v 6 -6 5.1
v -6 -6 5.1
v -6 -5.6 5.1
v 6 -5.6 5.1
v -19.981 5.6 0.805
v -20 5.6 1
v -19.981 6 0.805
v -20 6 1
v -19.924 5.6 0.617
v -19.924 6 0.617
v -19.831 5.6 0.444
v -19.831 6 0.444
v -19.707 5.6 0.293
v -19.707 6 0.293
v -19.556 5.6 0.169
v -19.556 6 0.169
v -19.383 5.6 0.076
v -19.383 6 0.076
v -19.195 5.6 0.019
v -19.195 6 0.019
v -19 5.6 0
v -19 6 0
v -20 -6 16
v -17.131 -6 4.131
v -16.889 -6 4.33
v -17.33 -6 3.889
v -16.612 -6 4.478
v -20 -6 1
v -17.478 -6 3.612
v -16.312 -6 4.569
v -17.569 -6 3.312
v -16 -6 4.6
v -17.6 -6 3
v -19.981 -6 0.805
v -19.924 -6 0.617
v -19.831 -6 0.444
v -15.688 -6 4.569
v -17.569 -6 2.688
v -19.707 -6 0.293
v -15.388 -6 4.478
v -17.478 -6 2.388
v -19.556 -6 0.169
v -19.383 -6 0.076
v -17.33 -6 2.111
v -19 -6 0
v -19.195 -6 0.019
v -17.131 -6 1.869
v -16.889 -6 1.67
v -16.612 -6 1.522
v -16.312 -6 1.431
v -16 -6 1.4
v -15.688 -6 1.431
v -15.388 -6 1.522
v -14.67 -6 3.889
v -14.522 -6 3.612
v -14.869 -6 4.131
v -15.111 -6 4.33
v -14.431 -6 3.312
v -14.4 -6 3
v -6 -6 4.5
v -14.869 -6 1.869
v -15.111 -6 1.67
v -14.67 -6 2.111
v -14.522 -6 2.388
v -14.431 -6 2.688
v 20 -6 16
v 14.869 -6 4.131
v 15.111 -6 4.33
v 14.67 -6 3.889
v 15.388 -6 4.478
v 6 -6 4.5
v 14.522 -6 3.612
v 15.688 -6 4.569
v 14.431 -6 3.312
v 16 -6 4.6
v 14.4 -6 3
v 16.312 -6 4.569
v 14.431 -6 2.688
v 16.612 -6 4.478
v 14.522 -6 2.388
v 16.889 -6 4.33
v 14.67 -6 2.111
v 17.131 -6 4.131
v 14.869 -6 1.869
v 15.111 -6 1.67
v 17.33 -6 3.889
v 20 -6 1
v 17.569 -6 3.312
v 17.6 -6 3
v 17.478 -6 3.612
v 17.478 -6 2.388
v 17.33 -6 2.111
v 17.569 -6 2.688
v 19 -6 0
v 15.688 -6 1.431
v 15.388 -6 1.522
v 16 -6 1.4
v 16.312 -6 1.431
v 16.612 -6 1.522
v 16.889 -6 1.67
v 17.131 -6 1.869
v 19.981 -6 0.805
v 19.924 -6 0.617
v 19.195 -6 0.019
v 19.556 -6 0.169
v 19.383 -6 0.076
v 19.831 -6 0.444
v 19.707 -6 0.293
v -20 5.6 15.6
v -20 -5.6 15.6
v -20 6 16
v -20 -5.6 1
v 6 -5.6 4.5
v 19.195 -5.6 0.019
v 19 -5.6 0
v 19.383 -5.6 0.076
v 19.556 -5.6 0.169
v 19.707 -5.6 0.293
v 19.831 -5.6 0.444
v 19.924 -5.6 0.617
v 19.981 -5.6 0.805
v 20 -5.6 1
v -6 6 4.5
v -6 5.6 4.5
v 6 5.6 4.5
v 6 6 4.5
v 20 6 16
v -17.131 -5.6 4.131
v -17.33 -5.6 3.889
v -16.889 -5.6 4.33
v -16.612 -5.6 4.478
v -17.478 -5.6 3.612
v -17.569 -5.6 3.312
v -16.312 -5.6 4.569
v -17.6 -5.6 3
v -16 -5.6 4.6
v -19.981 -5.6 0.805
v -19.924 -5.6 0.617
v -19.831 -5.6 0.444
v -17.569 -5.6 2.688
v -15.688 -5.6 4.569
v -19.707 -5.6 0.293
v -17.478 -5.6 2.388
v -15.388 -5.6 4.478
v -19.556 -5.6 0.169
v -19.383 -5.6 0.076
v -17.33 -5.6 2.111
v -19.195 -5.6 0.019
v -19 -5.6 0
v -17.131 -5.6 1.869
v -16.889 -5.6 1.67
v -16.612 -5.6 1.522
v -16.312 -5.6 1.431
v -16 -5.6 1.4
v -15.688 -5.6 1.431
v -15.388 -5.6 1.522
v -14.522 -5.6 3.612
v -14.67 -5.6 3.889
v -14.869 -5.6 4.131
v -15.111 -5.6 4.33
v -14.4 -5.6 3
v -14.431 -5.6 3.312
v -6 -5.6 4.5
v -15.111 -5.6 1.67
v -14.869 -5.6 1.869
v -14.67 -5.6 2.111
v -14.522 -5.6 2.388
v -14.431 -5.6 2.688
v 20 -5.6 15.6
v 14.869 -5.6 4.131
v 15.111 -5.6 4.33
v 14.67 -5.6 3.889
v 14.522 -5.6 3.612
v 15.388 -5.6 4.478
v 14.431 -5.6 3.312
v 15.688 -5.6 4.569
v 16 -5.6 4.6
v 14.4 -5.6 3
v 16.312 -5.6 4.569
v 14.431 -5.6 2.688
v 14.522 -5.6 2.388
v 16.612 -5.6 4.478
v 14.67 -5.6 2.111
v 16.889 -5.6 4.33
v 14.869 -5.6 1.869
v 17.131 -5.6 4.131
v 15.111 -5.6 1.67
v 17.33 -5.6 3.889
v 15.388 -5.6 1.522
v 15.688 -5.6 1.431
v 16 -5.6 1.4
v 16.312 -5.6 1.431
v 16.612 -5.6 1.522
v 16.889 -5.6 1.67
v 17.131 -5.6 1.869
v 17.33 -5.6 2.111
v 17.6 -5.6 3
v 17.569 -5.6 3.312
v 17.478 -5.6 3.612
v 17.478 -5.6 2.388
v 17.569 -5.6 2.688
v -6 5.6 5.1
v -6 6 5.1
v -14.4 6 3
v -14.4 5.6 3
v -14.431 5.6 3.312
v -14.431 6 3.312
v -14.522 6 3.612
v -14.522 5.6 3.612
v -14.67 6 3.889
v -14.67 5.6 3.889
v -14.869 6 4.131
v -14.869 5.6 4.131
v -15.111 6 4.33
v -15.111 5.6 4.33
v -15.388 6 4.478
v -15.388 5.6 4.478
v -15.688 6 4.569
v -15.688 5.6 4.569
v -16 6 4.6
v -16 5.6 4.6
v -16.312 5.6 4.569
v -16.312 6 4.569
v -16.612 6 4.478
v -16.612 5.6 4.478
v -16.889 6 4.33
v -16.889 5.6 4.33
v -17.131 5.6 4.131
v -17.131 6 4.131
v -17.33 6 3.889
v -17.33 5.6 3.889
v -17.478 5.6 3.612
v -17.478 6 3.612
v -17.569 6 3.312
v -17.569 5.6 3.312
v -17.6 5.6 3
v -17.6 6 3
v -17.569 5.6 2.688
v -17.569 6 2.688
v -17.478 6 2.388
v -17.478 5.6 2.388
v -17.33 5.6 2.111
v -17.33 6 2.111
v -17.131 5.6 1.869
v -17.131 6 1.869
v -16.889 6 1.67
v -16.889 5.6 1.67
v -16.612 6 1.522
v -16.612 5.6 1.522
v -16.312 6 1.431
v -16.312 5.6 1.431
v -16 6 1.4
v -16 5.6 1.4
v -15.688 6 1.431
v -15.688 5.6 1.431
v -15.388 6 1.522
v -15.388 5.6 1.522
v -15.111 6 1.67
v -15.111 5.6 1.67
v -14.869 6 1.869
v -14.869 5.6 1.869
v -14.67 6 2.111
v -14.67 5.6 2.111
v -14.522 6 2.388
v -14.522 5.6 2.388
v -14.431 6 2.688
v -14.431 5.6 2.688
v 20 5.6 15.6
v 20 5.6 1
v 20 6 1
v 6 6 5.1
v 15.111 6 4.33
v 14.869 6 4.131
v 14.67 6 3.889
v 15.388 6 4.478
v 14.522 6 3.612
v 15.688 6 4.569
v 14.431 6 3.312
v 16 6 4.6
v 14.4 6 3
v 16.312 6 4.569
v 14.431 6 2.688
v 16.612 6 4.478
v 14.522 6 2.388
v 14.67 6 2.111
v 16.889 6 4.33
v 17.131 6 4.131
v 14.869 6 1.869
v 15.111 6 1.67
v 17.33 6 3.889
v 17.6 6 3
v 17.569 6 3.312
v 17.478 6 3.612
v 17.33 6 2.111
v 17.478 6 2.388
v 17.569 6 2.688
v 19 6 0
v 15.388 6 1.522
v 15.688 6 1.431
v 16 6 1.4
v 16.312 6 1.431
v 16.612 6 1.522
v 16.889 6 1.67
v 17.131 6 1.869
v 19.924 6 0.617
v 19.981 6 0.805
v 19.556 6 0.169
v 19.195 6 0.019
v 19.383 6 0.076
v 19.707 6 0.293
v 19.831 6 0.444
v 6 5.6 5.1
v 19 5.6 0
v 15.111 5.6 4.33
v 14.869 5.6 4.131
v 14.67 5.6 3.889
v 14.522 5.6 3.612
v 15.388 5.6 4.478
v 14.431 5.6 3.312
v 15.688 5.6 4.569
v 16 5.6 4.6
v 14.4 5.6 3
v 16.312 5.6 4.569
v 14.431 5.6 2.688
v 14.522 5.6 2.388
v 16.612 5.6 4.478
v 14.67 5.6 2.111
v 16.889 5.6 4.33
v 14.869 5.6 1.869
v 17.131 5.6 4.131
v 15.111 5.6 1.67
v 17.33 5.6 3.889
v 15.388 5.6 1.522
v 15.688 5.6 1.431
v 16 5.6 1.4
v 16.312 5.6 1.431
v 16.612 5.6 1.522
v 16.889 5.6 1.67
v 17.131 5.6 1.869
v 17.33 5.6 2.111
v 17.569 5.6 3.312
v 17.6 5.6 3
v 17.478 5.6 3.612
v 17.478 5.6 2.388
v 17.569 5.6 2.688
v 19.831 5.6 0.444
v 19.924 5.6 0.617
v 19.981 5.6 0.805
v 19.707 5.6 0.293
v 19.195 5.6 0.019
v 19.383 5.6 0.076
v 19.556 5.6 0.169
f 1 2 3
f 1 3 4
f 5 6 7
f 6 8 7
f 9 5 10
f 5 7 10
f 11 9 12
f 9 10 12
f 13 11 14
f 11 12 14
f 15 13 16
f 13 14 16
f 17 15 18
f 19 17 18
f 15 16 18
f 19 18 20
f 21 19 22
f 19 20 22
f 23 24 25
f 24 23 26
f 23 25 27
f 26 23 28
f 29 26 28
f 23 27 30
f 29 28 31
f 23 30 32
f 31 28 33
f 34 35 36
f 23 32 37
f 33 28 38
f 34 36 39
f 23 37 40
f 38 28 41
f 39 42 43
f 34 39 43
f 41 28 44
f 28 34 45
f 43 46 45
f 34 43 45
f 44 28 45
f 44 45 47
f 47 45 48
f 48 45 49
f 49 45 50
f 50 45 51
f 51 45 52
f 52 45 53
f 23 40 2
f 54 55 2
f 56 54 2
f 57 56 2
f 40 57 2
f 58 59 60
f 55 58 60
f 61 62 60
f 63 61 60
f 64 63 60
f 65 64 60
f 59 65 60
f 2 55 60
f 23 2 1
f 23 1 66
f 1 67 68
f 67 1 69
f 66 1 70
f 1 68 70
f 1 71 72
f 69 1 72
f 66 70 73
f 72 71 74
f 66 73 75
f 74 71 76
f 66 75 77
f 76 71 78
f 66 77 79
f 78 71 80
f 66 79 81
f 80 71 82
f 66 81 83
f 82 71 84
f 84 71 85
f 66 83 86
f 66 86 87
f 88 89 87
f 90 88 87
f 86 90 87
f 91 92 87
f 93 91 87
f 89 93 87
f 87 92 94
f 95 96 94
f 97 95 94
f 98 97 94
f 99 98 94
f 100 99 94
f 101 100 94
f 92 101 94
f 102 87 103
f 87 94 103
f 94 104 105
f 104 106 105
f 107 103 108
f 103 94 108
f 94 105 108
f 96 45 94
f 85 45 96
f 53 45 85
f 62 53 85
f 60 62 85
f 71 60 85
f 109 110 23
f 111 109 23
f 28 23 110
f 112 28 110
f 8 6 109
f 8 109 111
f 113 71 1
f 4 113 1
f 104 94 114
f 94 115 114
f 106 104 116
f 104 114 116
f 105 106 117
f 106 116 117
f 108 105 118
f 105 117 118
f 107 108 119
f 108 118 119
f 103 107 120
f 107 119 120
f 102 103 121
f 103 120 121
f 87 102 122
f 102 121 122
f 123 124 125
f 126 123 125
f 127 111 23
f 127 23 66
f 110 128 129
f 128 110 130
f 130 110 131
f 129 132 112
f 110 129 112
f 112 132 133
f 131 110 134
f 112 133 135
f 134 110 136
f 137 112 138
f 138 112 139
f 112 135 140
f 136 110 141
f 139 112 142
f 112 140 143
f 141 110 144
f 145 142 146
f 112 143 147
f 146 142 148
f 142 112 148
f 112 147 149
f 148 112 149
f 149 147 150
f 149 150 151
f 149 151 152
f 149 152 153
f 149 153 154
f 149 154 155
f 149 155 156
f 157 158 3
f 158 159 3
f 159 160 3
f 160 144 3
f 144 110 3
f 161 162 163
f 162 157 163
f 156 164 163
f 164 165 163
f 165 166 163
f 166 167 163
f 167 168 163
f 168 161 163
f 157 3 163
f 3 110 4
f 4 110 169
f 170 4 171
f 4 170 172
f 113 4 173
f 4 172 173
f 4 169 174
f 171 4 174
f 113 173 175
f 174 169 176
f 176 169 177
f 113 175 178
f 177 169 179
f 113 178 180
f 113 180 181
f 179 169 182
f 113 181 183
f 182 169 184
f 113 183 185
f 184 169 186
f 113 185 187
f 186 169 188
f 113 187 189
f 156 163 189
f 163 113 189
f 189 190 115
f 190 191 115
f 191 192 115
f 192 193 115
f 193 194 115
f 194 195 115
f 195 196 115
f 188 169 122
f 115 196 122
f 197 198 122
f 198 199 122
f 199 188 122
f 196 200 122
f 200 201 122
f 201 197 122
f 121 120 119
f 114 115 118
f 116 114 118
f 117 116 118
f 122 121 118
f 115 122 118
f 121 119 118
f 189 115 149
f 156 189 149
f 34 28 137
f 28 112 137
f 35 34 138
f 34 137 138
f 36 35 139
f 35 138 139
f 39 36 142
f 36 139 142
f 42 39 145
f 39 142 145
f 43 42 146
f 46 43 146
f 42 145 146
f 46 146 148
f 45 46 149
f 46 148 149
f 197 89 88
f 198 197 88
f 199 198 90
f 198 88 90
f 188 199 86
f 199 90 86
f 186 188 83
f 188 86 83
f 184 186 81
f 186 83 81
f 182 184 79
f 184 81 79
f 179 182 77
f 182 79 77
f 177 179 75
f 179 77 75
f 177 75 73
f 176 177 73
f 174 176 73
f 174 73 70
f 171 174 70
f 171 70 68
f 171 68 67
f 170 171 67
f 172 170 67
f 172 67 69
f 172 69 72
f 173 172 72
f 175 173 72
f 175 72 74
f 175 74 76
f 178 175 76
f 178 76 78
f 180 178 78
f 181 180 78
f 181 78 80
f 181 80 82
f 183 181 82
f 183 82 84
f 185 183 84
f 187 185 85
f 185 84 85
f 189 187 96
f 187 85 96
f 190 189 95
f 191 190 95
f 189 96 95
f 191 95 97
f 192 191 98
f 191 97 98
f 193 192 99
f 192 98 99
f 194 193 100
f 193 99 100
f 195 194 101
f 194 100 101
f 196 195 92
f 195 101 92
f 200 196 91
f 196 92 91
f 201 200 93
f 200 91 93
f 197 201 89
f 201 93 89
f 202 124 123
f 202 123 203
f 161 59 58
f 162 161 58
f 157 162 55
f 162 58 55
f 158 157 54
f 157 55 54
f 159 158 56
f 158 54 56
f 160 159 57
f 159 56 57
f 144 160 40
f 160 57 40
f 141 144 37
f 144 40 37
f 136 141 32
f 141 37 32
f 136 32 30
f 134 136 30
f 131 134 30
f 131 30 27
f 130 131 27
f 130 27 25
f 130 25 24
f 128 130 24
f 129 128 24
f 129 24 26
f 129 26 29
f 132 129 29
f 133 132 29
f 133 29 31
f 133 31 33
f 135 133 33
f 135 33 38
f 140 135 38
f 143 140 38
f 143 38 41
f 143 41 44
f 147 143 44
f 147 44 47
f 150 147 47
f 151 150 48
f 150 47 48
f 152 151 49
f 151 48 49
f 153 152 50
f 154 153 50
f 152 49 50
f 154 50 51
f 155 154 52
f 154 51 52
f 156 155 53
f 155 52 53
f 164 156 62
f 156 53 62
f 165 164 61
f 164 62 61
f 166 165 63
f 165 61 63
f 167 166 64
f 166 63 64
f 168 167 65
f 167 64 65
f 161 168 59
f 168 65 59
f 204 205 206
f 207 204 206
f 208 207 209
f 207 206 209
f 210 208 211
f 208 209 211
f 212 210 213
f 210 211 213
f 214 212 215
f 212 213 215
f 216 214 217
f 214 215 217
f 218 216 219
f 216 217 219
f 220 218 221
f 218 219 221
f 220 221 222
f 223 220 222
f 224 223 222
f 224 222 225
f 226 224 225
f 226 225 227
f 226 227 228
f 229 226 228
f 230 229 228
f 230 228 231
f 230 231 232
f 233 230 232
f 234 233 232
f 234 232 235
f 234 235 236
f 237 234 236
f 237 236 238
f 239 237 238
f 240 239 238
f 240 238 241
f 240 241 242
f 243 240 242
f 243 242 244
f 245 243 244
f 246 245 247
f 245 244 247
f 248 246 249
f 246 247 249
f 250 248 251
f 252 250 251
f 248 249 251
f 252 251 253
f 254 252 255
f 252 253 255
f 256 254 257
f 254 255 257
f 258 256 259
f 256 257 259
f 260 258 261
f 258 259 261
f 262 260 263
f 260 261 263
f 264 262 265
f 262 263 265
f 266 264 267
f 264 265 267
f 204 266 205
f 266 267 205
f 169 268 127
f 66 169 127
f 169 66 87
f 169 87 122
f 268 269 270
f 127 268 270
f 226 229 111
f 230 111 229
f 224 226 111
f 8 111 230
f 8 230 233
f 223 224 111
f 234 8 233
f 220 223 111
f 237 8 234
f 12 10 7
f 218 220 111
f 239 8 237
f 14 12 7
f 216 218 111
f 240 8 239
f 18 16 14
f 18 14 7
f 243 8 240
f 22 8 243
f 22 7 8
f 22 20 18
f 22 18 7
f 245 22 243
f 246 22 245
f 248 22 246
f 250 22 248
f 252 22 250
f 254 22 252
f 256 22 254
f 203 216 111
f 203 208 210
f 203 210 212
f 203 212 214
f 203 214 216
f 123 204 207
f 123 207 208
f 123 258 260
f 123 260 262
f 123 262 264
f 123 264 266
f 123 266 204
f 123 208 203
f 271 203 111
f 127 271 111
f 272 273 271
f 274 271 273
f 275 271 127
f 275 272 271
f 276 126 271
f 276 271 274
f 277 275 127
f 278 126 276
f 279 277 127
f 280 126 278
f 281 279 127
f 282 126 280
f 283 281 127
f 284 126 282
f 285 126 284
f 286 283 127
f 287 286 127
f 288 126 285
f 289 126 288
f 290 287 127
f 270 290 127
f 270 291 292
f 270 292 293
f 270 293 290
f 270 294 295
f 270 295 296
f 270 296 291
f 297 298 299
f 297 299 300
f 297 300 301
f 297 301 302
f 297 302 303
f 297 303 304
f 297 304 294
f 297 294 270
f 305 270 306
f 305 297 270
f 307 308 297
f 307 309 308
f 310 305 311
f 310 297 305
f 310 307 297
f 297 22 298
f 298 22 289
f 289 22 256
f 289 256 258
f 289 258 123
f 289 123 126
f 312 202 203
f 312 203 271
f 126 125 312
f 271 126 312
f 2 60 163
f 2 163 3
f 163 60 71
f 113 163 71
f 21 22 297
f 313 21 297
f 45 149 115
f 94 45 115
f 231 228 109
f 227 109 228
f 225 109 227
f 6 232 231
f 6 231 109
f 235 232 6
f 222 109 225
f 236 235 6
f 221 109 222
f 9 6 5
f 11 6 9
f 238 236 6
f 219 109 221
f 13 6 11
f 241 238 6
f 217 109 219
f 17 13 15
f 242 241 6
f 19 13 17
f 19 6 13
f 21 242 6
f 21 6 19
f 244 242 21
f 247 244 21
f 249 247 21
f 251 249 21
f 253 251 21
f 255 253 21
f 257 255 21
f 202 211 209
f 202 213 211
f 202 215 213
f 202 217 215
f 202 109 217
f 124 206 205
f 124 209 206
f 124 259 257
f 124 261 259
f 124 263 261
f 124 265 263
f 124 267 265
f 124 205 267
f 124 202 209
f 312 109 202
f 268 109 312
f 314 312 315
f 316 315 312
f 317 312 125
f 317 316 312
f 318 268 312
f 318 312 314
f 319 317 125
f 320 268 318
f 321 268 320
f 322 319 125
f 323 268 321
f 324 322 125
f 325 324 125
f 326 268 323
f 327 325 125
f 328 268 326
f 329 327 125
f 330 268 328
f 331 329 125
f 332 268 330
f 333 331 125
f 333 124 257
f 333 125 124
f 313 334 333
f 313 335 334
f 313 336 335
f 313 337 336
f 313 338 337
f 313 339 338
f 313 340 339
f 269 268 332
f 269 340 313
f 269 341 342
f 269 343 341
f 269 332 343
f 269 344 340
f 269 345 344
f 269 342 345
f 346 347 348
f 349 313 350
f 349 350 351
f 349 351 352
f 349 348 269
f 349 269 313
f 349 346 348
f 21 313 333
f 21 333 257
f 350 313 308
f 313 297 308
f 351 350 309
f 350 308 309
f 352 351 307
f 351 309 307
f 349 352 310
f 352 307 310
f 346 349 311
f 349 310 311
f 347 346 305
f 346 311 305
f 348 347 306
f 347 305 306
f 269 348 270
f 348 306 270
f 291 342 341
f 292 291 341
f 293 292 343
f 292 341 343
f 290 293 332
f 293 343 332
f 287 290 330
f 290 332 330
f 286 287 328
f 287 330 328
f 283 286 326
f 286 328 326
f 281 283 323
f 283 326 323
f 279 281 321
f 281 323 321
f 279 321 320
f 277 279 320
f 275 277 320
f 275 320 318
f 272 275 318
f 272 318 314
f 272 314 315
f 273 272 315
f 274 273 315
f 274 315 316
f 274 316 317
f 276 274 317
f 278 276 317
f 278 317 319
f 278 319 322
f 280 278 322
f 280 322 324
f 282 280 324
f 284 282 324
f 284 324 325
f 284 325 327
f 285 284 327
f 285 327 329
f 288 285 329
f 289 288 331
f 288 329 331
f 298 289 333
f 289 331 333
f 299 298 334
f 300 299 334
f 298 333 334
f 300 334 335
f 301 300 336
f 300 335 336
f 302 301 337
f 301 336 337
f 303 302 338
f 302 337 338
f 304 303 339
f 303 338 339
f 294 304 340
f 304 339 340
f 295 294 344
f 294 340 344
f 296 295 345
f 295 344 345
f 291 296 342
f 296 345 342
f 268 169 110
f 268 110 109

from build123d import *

# Parameters (mm, degrees)
SKETCH1_W           = 40
SKETCH1_H           = 12
BOSS_EXTRUDE1_DEPTH = 16
SKETCH2_R           = 1.6
SKETCH2_W           = 12
SKETCH2_H           = 0.6
CUT_EXTRUDE1_DEPTH  = 13
SKETCH3_W           = 15.6
SKETCH3_H           = 11.2
CUT_EXTRUDE2_DEPTH  = 41
FILLET1_R           = 1


with BuildPart() as part:
    # Sketch1 → Boss-Extrude1 (new body)
    with BuildSketch(Plane.XY):
        Rectangle(SKETCH1_W, SKETCH1_H)
    extrude(amount=BOSS_EXTRUDE1_DEPTH)

    # Sketch2 → Cut-Extrude1 (cut, through all)
    with BuildSketch(Plane.XZ.offset(6)):
        with Locations((-16, 3)):
            Circle(SKETCH2_R)
        with Locations((16, 3)):
            Circle(SKETCH2_R)
        with Locations((0, 4.8)):
            Rectangle(SKETCH2_W, SKETCH2_H)
    extrude(amount=-CUT_EXTRUDE1_DEPTH, mode=Mode.SUBTRACT)

    # Sketch3 → Cut-Extrude2 (cut, through all)
    with BuildSketch(Plane(origin=(20, 0, 0), x_dir=(0, 0, -1), z_dir=(1, 0, 0))):
        with Locations((-7.8, 0)):
            Rectangle(SKETCH3_W, SKETCH3_H)
    extrude(amount=-CUT_EXTRUDE2_DEPTH, mode=Mode.SUBTRACT)

    # Fillet1
    fillet1_edges = [part.edges().sort_by_distance(p)[0] for p in [
        (20, 5.8, 0),
        (-20, -5.8, 0),
        (-20, 5.8, 0),
        (20, -5.8, 0),
    ]]
    fillet(fillet1_edges, radius=FILLET1_R)


solid = part.part
